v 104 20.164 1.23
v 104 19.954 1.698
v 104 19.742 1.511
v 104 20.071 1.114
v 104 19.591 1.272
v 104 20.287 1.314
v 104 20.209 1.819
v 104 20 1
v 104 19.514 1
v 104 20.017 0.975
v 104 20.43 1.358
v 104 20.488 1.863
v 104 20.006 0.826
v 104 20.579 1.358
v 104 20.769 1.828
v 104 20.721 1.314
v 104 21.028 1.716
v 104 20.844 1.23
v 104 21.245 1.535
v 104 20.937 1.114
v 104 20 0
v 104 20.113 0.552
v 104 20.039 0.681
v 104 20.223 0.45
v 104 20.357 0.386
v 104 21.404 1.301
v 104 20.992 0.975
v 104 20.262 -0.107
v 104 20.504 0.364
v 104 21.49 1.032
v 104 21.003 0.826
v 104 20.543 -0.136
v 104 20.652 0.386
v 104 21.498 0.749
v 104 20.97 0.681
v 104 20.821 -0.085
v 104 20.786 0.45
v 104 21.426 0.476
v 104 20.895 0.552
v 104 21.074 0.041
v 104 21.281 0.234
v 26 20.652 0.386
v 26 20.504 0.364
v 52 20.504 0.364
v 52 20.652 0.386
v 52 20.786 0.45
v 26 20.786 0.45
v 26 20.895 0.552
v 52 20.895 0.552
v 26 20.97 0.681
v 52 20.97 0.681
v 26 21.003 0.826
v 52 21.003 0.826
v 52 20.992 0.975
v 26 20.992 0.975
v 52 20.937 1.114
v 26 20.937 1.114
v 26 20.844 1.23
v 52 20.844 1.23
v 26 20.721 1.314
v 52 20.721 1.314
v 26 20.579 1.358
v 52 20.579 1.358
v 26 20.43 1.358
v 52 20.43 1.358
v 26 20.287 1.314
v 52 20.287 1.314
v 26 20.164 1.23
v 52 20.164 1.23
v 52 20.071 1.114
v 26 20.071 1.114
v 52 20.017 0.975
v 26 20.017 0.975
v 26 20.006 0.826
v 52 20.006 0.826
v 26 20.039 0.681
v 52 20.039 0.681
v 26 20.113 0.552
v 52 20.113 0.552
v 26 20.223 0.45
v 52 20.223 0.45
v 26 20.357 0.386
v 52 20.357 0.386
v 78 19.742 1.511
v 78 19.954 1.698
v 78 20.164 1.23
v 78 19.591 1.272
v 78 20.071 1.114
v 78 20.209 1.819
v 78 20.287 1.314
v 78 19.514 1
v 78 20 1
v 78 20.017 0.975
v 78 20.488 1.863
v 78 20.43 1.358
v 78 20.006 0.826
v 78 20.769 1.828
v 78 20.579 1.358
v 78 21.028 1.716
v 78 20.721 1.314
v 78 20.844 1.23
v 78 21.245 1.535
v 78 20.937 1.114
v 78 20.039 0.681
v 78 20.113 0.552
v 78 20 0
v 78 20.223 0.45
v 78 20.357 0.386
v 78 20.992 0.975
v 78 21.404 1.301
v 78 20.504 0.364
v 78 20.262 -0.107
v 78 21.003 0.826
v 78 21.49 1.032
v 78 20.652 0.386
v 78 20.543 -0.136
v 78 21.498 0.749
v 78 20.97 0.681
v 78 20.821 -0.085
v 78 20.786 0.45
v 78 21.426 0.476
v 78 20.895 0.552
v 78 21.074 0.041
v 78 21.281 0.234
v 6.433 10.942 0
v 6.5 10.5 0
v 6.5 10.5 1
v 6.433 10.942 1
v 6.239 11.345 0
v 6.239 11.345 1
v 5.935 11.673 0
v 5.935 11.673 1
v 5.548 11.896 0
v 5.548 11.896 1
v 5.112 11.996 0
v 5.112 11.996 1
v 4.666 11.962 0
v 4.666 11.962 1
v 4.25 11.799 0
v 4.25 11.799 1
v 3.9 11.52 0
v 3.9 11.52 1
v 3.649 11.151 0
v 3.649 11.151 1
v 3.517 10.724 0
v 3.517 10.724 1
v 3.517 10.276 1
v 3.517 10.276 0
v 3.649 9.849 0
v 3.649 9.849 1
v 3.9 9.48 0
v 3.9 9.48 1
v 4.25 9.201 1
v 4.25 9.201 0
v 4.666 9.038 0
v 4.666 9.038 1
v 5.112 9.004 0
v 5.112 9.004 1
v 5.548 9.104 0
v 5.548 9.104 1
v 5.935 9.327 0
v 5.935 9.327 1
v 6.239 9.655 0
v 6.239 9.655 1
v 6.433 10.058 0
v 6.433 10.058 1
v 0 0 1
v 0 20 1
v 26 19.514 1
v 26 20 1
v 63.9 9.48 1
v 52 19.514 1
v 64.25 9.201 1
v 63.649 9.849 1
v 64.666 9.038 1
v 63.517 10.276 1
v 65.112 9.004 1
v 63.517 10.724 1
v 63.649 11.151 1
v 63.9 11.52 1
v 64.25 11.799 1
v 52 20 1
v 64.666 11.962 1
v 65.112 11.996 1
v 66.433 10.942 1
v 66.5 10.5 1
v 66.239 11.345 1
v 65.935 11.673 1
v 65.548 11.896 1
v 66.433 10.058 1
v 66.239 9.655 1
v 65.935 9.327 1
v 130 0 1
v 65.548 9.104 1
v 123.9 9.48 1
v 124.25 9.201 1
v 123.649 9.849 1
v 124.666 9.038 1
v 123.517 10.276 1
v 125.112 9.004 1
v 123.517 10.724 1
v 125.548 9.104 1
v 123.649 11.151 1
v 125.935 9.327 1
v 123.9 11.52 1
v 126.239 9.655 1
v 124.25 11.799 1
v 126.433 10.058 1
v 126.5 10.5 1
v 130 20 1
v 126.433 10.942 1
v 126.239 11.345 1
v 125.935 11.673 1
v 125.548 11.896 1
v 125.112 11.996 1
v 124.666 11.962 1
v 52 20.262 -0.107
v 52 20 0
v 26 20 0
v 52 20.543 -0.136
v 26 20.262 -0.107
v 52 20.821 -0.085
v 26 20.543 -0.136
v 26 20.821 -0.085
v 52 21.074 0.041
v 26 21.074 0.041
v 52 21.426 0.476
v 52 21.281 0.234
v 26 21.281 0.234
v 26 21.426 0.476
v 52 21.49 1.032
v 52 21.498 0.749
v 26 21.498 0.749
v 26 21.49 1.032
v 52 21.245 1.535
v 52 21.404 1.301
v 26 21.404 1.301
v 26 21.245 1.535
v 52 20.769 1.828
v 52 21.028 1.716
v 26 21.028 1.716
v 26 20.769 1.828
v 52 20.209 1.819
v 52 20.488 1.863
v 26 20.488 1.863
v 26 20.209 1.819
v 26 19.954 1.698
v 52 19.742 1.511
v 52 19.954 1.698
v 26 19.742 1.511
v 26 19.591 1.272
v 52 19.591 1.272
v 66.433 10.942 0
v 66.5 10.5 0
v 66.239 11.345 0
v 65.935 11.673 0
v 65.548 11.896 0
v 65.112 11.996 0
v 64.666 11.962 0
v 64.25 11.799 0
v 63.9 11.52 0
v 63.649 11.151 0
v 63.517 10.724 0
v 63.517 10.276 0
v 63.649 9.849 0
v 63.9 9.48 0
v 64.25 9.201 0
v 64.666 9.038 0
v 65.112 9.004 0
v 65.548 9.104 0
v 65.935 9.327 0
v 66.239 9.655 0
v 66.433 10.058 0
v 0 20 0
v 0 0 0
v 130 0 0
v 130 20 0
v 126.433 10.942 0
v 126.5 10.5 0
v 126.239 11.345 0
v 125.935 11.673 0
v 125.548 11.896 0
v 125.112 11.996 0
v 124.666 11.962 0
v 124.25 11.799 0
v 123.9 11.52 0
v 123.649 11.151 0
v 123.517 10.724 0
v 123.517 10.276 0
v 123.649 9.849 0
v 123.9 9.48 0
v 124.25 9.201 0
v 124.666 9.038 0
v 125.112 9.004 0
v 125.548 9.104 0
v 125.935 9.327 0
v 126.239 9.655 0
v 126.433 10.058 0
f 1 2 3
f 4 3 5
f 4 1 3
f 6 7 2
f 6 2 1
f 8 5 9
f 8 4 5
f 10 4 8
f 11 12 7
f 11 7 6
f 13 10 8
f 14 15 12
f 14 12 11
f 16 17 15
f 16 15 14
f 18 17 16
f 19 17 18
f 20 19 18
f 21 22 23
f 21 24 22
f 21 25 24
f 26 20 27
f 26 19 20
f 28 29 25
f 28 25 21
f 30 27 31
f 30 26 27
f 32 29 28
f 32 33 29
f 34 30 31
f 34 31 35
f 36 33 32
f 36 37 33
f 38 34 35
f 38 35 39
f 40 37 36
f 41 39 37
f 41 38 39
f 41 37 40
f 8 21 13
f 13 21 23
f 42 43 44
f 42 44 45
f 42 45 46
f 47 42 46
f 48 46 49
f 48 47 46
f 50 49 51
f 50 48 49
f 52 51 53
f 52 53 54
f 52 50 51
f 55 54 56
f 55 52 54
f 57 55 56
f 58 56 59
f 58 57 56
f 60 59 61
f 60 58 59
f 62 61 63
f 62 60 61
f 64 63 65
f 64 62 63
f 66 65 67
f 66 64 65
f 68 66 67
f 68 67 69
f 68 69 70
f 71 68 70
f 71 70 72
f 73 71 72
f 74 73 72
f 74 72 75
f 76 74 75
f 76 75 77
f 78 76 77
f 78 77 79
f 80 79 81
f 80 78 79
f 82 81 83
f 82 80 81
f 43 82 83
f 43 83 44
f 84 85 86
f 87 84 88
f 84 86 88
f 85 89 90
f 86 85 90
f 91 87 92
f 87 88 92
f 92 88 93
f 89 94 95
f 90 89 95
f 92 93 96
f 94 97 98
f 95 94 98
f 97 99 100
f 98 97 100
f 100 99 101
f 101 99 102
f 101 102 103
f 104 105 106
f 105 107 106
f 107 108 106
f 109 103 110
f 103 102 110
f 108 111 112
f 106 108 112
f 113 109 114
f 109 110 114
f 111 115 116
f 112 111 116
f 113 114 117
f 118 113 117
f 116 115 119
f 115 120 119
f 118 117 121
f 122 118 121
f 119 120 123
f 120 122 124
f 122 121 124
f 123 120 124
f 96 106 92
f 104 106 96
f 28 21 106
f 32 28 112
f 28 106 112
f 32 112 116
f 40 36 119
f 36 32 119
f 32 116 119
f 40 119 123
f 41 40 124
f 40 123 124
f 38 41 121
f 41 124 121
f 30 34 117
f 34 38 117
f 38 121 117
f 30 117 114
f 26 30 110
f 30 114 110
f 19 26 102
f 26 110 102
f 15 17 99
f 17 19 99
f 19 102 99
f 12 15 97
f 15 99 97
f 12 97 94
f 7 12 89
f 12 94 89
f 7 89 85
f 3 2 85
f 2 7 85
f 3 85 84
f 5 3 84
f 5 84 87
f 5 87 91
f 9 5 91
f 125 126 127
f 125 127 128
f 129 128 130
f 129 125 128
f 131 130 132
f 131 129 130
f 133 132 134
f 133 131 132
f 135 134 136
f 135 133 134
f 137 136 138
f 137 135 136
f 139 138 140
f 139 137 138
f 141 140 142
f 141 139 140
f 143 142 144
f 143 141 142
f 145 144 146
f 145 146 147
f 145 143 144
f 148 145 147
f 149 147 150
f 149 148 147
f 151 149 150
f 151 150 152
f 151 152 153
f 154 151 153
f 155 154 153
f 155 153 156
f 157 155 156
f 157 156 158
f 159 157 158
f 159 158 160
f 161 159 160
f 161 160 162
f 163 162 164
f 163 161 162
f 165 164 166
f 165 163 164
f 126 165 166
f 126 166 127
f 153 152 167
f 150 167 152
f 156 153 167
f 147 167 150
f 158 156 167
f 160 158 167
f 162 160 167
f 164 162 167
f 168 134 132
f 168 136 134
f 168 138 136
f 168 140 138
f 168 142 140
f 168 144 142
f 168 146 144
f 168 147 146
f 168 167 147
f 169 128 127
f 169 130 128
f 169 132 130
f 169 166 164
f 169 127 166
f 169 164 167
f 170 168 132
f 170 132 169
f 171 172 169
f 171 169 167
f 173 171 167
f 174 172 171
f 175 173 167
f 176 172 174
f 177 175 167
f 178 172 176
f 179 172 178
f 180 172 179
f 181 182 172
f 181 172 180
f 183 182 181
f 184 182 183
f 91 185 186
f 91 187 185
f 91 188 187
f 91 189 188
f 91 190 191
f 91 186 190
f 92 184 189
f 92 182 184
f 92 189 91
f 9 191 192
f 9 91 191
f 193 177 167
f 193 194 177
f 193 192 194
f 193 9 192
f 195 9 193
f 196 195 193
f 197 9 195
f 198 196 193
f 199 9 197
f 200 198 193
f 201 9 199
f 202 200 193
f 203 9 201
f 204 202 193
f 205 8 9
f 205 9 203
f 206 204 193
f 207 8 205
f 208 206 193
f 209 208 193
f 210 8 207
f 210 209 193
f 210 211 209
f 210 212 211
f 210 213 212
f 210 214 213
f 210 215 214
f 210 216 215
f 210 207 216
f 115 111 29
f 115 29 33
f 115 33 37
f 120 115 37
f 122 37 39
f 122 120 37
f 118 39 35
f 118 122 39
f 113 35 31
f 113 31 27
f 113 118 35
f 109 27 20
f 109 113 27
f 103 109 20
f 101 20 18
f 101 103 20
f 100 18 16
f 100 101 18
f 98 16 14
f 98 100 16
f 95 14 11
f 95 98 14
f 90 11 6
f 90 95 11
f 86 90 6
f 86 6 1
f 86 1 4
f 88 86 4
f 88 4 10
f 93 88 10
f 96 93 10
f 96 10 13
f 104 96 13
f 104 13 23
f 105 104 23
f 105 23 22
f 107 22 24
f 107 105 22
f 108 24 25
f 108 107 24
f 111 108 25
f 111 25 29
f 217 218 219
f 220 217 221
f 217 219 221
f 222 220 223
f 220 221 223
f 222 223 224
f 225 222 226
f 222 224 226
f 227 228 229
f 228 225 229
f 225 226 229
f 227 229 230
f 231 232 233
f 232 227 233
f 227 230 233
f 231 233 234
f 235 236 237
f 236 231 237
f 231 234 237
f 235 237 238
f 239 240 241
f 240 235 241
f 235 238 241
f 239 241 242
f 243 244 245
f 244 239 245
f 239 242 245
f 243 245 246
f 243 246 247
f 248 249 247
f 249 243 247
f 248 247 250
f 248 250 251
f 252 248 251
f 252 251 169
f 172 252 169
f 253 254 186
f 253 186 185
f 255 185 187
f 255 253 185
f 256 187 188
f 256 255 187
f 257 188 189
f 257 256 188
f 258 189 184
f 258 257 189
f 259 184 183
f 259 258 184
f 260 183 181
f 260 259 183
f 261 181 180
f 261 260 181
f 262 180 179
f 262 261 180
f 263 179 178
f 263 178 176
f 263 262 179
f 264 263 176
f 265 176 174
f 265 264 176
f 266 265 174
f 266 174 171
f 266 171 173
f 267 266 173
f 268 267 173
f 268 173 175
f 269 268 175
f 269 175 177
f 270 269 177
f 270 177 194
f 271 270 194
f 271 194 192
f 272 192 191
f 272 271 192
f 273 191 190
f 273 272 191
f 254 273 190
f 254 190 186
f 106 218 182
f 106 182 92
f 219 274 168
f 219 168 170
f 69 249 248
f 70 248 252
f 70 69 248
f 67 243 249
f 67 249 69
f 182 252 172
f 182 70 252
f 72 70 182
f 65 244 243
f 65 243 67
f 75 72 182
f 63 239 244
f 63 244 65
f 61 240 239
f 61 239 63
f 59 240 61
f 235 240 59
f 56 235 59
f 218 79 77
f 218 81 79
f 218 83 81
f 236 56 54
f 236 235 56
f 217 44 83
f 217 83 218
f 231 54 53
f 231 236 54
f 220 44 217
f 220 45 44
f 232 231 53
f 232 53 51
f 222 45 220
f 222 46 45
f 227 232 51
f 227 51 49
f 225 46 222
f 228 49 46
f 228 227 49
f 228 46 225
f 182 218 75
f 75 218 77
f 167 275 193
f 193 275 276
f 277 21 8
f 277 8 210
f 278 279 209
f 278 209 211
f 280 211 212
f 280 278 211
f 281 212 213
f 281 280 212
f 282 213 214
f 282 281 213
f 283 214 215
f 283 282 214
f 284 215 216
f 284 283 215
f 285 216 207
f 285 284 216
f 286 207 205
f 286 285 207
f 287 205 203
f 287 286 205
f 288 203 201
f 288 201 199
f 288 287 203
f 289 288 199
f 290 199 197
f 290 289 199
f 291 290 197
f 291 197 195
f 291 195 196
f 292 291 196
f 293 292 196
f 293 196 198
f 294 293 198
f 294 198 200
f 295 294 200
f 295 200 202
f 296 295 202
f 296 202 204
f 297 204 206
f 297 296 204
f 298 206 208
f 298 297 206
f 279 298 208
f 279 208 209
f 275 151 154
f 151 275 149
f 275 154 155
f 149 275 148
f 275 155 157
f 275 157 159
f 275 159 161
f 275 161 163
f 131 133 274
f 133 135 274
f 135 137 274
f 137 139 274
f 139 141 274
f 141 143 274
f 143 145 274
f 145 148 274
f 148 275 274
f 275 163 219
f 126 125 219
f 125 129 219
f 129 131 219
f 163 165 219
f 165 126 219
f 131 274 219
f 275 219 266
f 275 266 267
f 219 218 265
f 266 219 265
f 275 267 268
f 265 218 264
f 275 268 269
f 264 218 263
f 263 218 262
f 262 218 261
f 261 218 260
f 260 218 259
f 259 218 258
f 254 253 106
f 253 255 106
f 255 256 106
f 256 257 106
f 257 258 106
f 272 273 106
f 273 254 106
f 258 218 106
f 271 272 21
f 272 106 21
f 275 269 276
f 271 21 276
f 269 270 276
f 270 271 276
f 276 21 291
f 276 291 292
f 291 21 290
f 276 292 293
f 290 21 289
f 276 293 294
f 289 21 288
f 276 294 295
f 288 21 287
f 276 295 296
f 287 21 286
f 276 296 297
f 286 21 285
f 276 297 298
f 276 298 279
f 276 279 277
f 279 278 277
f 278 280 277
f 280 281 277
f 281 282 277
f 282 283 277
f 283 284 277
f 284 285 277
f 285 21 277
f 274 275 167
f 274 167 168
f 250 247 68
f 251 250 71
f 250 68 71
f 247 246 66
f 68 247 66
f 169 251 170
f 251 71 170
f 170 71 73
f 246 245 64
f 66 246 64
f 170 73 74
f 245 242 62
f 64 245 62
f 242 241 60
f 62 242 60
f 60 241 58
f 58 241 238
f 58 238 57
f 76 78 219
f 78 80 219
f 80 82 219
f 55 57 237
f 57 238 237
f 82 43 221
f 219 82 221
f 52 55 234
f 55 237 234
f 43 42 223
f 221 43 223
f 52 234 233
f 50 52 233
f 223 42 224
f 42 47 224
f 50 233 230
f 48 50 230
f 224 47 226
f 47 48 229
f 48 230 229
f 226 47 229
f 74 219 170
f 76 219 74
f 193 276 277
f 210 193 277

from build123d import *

# Parameters (mm, degrees)
SKETCH1_W           = 130
SKETCH1_H           = 20
SKETCH1_R           = 1.5
BOSS_EXTRUDE1_DEPTH = 1
BOSS_EXTRUDE2_START = 26
SKETCH3_R           = 1
SKETCH3_R_2         = 0.5
BOSS_EXTRUDE2_DEPTH = 26
LPATTERN1_COUNT     = 2
LPATTERN1_PITCH     = 52


with BuildPart() as part:
    # Sketch1 → Boss-Extrude1 (new body)
    with BuildSketch(Plane.XY):
        with Locations((65, 10)):
            Rectangle(SKETCH1_W, SKETCH1_H)
        with Locations((65, 10.5)):
            Circle(SKETCH1_R, mode=Mode.SUBTRACT)
        with Locations((5, 10.5)):
            Circle(SKETCH1_R, mode=Mode.SUBTRACT)
        with Locations((125, 10.5)):
            Circle(SKETCH1_R, mode=Mode.SUBTRACT)
    extrude(amount=BOSS_EXTRUDE1_DEPTH)

    # Sketch3 → Boss-Extrude2 (add)
    with BuildSketch(Plane(origin=(0, 0, 0), x_dir=(0, 0, -1), z_dir=(1, 0, 0)).offset(BOSS_EXTRUDE2_START)):
        with Locations((-0.863530112, 20.504297279)):
            Circle(SKETCH3_R)
        with Locations((-0.863530112, 20.504297279)):
            Circle(SKETCH3_R_2, mode=Mode.SUBTRACT)
    boss_extrude2 = extrude(amount=BOSS_EXTRUDE2_DEPTH)

    # LPattern1: Boss-Extrude2 ×2
    with Locations(*[(i * LPATTERN1_PITCH, 0, 0) for i in range(1, LPATTERN1_COUNT)]):
        add(boss_extrude2)


solid = part.part
